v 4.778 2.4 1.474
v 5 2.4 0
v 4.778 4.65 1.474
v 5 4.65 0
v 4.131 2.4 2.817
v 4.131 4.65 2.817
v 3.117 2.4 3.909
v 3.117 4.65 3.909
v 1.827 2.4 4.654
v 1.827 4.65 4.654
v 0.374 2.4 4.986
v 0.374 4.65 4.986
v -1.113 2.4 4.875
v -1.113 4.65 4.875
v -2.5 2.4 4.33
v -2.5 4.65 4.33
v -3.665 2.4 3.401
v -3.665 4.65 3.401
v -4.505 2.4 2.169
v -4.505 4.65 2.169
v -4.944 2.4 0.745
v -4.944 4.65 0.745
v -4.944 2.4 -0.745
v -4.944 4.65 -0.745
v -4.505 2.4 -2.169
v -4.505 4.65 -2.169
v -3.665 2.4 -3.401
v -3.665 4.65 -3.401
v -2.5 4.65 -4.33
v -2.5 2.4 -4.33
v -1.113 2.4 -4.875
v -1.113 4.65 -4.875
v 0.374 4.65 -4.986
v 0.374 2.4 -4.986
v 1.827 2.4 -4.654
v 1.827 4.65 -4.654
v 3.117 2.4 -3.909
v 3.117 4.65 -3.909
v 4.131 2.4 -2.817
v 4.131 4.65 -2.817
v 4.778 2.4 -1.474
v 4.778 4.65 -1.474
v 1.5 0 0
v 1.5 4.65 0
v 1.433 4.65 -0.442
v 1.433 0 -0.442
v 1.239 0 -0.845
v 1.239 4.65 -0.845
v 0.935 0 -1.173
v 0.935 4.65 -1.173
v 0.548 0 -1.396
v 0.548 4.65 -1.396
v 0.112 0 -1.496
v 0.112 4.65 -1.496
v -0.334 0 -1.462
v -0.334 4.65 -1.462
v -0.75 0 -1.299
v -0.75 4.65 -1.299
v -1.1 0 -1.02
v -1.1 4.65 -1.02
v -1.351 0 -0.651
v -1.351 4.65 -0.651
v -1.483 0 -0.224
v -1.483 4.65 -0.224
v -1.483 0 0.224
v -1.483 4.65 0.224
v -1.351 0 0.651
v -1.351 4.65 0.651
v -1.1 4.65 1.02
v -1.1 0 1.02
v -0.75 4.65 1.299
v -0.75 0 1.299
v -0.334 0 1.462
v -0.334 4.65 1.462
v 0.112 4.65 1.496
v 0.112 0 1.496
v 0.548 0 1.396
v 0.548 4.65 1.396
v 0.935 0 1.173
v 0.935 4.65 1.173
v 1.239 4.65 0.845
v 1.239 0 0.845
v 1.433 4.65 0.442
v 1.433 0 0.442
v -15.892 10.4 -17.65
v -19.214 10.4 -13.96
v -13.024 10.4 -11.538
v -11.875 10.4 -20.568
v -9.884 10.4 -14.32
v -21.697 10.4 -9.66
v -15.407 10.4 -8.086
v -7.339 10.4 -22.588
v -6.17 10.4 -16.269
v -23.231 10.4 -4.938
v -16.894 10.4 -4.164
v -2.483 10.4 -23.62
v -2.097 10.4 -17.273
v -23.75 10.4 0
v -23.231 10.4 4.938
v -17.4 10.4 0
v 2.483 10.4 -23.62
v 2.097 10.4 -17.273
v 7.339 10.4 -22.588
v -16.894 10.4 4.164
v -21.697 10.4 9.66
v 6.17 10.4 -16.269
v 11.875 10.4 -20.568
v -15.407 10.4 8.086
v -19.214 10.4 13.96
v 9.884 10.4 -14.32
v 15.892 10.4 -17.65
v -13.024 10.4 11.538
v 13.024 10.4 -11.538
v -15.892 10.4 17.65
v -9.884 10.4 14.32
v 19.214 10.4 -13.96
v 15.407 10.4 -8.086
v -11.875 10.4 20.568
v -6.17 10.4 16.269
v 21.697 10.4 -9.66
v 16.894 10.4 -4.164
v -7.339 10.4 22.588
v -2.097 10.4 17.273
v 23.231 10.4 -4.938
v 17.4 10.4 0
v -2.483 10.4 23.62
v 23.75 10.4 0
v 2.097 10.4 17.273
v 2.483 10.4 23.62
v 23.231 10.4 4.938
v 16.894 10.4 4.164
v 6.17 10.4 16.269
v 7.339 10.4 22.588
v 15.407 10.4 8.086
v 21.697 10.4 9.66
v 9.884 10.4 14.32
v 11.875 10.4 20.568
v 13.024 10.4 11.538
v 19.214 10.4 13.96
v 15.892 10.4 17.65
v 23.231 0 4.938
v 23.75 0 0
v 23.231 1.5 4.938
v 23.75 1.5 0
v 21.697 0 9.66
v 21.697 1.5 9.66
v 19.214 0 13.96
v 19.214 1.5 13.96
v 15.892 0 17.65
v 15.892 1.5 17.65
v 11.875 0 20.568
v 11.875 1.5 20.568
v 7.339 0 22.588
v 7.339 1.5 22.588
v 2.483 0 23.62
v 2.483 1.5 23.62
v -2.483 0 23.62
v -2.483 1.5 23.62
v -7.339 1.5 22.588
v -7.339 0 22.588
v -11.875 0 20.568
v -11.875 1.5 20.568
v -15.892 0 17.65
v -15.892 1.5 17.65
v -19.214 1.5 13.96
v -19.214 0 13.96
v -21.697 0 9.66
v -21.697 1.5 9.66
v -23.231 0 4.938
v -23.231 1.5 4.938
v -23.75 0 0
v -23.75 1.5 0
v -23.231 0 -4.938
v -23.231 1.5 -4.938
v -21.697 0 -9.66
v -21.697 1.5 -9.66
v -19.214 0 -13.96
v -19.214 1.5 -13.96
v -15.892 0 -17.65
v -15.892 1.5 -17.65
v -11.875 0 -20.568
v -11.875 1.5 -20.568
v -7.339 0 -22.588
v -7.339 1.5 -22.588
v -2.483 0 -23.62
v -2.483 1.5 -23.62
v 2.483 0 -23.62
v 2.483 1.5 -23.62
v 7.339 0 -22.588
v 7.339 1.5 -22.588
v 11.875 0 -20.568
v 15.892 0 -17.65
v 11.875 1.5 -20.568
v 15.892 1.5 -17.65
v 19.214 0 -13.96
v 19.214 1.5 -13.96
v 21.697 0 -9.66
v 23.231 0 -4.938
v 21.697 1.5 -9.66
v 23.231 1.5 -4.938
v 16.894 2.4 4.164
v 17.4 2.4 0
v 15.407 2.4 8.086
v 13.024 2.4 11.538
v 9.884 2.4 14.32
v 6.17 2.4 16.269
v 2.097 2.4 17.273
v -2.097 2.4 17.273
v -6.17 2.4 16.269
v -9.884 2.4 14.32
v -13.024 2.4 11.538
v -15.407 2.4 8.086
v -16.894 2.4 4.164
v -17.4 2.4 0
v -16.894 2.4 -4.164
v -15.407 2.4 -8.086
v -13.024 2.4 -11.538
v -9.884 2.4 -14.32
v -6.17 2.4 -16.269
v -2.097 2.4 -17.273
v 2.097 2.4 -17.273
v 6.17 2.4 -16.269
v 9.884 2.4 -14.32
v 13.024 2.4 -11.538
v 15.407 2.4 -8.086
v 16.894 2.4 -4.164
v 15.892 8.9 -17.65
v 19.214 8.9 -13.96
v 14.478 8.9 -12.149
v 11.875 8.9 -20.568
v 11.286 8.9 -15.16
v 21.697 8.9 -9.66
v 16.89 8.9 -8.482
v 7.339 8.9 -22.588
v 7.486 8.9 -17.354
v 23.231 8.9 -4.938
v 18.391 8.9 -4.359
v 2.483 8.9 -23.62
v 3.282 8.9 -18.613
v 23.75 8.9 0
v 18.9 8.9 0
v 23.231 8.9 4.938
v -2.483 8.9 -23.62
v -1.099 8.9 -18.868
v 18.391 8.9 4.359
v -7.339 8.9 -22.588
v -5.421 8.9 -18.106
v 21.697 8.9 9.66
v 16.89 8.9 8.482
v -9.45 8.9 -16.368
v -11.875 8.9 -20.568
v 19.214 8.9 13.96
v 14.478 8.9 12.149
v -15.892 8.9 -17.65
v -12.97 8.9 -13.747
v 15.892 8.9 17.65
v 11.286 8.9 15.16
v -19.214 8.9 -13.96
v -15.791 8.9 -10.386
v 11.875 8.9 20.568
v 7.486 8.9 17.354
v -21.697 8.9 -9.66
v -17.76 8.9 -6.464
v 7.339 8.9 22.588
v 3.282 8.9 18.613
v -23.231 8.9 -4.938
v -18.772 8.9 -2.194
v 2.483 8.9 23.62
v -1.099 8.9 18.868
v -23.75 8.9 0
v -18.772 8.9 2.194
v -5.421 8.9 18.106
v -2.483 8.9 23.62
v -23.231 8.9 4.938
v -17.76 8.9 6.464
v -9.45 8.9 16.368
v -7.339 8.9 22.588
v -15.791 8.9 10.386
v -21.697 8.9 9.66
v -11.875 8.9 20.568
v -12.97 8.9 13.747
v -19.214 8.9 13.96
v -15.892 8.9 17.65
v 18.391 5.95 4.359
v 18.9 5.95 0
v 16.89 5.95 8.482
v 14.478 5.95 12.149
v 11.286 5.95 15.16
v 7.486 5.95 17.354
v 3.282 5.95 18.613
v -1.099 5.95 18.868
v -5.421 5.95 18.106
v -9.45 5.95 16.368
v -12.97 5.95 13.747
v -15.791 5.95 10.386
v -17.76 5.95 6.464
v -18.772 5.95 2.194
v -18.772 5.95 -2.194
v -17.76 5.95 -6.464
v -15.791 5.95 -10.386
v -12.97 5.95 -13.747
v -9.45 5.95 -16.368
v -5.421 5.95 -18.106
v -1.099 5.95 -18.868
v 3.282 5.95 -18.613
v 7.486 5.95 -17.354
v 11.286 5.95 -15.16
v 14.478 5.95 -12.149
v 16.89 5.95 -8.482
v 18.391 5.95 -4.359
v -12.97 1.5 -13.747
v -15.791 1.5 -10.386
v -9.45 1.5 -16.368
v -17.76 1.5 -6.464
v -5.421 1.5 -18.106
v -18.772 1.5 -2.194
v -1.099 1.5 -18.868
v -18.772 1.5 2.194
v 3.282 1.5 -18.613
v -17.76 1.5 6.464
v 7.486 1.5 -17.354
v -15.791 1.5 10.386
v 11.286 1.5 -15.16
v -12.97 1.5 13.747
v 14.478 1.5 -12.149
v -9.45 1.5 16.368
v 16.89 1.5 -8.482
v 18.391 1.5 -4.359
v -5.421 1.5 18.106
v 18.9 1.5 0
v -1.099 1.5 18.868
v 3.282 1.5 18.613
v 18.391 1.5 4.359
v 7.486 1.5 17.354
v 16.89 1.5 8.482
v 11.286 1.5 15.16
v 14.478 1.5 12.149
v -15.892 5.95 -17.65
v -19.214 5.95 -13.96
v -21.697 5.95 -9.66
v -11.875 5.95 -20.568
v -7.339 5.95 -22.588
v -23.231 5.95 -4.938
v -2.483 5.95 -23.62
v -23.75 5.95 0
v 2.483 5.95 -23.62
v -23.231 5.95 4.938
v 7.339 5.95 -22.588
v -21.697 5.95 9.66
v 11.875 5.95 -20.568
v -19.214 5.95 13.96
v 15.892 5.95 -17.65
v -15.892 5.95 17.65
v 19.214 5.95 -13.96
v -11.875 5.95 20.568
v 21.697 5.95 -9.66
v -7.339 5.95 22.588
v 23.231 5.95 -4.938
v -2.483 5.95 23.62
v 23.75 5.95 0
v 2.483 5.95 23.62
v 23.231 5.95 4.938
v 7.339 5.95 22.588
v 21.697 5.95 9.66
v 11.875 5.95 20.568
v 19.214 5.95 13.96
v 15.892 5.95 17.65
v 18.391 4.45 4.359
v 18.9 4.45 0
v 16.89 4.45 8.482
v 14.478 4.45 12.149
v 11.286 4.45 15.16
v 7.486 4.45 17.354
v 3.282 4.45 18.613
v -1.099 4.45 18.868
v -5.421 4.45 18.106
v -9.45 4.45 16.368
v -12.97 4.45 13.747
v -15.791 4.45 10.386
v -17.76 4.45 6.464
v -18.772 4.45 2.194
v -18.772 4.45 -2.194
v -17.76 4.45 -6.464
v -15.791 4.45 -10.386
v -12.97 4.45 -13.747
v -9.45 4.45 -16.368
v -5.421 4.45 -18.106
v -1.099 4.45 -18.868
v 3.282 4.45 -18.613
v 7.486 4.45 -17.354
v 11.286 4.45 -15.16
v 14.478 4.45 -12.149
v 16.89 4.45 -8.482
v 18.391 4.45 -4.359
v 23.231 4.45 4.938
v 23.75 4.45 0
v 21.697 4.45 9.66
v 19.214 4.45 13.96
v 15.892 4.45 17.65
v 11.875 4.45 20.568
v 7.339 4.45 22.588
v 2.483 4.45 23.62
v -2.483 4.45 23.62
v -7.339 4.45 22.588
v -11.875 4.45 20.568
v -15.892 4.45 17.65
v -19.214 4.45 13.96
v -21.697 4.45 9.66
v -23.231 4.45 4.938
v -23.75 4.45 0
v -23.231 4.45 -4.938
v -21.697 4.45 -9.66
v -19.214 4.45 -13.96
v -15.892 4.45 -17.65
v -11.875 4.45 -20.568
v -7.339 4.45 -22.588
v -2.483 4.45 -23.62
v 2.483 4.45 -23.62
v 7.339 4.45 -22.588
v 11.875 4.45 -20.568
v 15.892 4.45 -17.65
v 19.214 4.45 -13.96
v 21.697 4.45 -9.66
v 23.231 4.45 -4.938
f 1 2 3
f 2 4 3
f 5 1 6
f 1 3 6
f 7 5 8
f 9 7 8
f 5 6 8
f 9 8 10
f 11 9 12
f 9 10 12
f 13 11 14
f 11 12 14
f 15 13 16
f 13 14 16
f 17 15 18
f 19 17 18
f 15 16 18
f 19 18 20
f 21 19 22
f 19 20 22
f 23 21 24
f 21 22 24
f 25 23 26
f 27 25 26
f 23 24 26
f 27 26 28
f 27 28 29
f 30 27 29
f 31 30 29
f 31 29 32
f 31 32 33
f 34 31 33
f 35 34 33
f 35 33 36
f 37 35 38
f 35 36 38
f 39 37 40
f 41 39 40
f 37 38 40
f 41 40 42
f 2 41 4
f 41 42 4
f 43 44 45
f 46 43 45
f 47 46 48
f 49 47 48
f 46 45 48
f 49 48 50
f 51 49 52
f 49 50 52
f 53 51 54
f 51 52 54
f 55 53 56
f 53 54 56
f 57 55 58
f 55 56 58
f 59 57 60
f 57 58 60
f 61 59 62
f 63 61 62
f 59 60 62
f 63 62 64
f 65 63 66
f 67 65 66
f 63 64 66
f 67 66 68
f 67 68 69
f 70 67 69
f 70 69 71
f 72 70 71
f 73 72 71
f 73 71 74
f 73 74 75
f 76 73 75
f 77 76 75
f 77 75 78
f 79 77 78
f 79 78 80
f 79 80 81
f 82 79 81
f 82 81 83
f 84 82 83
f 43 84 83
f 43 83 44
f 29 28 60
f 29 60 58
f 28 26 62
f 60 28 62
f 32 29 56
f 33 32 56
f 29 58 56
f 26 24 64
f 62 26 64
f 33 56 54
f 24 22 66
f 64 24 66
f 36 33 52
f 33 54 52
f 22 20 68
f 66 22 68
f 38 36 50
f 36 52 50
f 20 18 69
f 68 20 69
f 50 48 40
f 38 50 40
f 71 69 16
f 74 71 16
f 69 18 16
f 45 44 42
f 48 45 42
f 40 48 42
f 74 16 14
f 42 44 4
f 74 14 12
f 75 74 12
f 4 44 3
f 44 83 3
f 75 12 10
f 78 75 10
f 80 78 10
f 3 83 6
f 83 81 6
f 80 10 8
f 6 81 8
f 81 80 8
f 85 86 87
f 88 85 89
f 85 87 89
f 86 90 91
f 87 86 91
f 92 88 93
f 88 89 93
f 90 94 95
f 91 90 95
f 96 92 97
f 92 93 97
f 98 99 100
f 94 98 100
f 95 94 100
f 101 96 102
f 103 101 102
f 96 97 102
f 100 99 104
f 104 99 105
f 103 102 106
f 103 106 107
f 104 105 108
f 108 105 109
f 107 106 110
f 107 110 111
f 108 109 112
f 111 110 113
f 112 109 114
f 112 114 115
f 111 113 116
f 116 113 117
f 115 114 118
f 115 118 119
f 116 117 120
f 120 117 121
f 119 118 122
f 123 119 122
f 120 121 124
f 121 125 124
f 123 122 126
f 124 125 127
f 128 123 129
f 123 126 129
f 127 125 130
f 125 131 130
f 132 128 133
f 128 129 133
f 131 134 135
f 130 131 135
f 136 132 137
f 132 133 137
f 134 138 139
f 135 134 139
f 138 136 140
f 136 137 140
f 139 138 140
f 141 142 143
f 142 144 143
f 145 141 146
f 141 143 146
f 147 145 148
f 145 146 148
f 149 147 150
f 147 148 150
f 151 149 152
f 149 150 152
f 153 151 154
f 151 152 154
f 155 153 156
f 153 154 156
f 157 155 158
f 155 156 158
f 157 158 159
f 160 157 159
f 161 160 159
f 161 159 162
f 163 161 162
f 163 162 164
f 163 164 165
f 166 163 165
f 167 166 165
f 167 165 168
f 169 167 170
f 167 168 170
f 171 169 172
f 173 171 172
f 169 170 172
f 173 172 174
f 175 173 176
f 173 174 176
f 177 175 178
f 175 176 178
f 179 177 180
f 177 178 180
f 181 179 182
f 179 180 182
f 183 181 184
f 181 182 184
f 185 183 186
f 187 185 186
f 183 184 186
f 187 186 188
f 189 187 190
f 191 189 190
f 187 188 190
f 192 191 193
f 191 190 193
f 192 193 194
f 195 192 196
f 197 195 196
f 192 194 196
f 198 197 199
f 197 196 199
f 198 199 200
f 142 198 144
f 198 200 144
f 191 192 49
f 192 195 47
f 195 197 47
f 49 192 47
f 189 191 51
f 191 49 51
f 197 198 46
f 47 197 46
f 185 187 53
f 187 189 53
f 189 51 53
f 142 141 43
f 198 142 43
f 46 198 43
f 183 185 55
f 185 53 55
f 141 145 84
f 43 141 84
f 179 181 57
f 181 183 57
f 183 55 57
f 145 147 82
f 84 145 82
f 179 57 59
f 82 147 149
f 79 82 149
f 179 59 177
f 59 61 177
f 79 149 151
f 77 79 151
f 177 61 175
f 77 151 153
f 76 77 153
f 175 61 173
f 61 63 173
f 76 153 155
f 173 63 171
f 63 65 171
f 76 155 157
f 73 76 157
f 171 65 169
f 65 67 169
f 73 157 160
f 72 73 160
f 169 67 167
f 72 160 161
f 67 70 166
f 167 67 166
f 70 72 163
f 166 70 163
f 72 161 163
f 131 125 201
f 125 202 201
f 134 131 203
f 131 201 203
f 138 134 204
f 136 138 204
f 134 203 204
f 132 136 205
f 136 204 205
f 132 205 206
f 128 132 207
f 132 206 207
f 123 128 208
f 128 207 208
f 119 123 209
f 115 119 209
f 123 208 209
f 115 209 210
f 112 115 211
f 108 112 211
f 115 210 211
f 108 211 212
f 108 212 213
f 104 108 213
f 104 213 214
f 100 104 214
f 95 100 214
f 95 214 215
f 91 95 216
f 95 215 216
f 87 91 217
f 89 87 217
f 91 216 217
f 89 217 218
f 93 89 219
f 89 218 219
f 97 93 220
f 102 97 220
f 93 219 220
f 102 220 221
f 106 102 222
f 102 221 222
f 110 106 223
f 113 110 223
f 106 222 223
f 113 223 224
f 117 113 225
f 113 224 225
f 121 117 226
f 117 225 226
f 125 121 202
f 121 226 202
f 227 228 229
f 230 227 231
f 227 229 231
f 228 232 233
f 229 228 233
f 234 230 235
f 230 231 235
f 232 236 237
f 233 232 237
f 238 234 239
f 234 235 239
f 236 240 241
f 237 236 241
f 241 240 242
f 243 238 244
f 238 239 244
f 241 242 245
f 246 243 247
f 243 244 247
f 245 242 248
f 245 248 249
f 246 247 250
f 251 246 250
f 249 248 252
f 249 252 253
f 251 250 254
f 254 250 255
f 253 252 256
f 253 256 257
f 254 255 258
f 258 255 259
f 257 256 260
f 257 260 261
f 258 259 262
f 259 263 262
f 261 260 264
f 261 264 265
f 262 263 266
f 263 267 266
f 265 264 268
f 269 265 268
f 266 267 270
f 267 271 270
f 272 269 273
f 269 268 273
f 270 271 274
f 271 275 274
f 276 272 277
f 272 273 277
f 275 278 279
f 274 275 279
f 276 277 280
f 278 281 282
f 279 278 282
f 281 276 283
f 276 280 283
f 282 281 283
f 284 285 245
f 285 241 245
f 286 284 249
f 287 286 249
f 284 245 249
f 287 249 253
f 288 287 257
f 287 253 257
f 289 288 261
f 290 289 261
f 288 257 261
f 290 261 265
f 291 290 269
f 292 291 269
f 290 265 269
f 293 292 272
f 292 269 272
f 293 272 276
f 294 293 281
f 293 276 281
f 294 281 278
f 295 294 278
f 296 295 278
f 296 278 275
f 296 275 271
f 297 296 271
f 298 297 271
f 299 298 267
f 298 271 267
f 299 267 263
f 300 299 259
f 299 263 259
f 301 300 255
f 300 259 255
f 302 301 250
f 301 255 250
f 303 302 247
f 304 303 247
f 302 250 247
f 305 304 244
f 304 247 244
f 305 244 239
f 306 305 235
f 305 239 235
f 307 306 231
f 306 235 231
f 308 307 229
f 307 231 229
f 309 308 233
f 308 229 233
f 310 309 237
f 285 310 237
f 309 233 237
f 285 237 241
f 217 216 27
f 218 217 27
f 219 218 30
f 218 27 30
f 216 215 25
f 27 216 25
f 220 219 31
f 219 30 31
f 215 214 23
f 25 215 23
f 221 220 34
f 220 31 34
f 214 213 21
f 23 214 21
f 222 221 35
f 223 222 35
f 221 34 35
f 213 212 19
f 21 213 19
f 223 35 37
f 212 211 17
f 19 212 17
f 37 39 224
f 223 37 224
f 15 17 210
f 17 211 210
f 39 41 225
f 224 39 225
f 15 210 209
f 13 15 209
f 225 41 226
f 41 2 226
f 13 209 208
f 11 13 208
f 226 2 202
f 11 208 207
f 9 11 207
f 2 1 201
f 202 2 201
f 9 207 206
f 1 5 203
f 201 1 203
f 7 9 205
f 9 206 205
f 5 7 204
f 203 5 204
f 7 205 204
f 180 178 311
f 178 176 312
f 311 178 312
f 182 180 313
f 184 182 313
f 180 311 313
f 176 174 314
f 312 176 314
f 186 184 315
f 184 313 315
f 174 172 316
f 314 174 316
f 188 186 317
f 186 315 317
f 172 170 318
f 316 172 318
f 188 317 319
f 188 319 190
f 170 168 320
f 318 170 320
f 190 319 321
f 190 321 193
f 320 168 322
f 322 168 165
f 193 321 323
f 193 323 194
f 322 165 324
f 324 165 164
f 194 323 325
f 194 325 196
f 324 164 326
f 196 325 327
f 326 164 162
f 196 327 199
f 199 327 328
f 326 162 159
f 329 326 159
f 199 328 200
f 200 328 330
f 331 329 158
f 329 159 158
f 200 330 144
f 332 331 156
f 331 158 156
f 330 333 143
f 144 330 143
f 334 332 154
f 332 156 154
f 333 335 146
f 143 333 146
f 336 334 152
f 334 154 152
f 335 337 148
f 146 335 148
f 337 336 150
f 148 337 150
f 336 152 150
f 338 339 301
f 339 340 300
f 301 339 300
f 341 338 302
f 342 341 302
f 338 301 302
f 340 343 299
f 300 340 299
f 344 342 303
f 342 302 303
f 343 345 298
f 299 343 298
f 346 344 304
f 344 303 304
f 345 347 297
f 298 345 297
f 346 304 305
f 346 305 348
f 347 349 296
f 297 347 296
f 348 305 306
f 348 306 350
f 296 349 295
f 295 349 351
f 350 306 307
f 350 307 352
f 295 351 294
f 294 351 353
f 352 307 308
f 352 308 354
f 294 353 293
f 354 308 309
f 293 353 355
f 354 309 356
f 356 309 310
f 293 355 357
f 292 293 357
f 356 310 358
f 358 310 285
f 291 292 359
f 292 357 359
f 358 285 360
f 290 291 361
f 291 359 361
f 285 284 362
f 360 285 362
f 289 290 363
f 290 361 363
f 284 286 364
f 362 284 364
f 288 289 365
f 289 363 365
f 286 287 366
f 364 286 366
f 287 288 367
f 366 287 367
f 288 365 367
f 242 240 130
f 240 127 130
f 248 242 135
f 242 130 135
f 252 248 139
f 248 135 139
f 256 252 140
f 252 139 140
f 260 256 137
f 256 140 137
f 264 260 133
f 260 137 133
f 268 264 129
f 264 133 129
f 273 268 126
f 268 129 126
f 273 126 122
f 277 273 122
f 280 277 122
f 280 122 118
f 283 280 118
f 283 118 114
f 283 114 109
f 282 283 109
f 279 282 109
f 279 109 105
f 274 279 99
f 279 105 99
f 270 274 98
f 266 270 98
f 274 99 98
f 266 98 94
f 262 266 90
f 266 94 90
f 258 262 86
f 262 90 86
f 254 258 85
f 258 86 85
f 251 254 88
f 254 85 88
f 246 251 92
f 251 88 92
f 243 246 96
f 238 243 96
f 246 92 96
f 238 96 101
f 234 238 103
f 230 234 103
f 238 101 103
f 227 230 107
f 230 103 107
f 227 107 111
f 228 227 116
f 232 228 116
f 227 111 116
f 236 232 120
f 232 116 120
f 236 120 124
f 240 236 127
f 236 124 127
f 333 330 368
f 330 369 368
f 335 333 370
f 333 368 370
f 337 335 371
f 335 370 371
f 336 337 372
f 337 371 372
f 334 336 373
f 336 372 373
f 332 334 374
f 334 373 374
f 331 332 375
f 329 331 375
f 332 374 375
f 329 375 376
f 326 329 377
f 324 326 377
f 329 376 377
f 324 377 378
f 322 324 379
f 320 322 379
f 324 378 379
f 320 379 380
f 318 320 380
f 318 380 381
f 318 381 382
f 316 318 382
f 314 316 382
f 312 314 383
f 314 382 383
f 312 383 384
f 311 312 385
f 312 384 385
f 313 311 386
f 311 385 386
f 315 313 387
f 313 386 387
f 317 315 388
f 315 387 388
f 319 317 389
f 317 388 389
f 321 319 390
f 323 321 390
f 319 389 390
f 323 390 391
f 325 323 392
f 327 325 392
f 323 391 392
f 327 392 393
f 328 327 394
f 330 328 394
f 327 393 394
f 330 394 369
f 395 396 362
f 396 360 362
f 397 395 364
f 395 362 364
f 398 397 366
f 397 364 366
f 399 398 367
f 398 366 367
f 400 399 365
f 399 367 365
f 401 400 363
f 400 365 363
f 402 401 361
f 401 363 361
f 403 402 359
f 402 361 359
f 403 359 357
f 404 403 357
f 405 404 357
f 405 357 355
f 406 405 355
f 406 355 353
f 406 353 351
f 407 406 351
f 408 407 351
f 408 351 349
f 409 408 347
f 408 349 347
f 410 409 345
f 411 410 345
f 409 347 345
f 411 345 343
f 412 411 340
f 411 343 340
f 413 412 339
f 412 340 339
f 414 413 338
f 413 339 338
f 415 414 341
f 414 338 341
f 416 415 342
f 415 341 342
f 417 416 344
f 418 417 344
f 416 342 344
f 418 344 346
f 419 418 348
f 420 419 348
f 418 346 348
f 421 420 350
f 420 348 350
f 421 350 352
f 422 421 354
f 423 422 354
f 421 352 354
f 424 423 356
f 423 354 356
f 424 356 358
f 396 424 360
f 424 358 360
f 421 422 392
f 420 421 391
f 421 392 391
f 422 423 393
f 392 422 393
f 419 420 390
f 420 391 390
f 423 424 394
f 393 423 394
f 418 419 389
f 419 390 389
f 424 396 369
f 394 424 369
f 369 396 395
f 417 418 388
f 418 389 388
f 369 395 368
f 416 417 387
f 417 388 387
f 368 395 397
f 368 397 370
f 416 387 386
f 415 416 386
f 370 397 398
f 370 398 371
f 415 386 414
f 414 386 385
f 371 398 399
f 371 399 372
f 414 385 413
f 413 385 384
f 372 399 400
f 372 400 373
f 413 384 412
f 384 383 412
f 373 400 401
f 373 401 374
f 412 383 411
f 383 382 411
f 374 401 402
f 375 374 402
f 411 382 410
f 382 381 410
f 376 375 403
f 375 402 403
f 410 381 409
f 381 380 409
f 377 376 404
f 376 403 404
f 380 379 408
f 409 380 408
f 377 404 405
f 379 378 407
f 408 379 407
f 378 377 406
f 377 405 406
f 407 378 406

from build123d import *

# Parameters (mm, degrees)
SKETCH2_R          = 1.5
CUT_EXTRUDE1_DEPTH = 5.65


with BuildPart() as part:
    # Sketch1 → Revolve1 (revolve)
    with BuildSketch(Plane.XY):
        Polygon((0, 0), (23.75, 0), (23.75, 1.5), (18.9, 1.5), (18.9, 4.45), (23.75, 4.45), (23.75, 5.95), (18.9, 5.95), (18.9, 8.9), (23.75, 8.9), (23.75, 10.4), (17.4, 10.4), (17.4, 2.4), (5, 2.4), (5, 4.65), (0, 4.65), align=None)
    revolve(axis=Axis((0, 4.65, 0), (0, -1, 0)))

    # Sketch2 → Cut-Extrude1 (cut, through all)
    with BuildSketch(Plane(origin=(0, 4.65, 0), x_dir=(1, 0, 0), z_dir=(0, 1, 0))):
        Circle(SKETCH2_R)
    extrude(amount=-CUT_EXTRUDE1_DEPTH, mode=Mode.SUBTRACT)


solid = part.part
